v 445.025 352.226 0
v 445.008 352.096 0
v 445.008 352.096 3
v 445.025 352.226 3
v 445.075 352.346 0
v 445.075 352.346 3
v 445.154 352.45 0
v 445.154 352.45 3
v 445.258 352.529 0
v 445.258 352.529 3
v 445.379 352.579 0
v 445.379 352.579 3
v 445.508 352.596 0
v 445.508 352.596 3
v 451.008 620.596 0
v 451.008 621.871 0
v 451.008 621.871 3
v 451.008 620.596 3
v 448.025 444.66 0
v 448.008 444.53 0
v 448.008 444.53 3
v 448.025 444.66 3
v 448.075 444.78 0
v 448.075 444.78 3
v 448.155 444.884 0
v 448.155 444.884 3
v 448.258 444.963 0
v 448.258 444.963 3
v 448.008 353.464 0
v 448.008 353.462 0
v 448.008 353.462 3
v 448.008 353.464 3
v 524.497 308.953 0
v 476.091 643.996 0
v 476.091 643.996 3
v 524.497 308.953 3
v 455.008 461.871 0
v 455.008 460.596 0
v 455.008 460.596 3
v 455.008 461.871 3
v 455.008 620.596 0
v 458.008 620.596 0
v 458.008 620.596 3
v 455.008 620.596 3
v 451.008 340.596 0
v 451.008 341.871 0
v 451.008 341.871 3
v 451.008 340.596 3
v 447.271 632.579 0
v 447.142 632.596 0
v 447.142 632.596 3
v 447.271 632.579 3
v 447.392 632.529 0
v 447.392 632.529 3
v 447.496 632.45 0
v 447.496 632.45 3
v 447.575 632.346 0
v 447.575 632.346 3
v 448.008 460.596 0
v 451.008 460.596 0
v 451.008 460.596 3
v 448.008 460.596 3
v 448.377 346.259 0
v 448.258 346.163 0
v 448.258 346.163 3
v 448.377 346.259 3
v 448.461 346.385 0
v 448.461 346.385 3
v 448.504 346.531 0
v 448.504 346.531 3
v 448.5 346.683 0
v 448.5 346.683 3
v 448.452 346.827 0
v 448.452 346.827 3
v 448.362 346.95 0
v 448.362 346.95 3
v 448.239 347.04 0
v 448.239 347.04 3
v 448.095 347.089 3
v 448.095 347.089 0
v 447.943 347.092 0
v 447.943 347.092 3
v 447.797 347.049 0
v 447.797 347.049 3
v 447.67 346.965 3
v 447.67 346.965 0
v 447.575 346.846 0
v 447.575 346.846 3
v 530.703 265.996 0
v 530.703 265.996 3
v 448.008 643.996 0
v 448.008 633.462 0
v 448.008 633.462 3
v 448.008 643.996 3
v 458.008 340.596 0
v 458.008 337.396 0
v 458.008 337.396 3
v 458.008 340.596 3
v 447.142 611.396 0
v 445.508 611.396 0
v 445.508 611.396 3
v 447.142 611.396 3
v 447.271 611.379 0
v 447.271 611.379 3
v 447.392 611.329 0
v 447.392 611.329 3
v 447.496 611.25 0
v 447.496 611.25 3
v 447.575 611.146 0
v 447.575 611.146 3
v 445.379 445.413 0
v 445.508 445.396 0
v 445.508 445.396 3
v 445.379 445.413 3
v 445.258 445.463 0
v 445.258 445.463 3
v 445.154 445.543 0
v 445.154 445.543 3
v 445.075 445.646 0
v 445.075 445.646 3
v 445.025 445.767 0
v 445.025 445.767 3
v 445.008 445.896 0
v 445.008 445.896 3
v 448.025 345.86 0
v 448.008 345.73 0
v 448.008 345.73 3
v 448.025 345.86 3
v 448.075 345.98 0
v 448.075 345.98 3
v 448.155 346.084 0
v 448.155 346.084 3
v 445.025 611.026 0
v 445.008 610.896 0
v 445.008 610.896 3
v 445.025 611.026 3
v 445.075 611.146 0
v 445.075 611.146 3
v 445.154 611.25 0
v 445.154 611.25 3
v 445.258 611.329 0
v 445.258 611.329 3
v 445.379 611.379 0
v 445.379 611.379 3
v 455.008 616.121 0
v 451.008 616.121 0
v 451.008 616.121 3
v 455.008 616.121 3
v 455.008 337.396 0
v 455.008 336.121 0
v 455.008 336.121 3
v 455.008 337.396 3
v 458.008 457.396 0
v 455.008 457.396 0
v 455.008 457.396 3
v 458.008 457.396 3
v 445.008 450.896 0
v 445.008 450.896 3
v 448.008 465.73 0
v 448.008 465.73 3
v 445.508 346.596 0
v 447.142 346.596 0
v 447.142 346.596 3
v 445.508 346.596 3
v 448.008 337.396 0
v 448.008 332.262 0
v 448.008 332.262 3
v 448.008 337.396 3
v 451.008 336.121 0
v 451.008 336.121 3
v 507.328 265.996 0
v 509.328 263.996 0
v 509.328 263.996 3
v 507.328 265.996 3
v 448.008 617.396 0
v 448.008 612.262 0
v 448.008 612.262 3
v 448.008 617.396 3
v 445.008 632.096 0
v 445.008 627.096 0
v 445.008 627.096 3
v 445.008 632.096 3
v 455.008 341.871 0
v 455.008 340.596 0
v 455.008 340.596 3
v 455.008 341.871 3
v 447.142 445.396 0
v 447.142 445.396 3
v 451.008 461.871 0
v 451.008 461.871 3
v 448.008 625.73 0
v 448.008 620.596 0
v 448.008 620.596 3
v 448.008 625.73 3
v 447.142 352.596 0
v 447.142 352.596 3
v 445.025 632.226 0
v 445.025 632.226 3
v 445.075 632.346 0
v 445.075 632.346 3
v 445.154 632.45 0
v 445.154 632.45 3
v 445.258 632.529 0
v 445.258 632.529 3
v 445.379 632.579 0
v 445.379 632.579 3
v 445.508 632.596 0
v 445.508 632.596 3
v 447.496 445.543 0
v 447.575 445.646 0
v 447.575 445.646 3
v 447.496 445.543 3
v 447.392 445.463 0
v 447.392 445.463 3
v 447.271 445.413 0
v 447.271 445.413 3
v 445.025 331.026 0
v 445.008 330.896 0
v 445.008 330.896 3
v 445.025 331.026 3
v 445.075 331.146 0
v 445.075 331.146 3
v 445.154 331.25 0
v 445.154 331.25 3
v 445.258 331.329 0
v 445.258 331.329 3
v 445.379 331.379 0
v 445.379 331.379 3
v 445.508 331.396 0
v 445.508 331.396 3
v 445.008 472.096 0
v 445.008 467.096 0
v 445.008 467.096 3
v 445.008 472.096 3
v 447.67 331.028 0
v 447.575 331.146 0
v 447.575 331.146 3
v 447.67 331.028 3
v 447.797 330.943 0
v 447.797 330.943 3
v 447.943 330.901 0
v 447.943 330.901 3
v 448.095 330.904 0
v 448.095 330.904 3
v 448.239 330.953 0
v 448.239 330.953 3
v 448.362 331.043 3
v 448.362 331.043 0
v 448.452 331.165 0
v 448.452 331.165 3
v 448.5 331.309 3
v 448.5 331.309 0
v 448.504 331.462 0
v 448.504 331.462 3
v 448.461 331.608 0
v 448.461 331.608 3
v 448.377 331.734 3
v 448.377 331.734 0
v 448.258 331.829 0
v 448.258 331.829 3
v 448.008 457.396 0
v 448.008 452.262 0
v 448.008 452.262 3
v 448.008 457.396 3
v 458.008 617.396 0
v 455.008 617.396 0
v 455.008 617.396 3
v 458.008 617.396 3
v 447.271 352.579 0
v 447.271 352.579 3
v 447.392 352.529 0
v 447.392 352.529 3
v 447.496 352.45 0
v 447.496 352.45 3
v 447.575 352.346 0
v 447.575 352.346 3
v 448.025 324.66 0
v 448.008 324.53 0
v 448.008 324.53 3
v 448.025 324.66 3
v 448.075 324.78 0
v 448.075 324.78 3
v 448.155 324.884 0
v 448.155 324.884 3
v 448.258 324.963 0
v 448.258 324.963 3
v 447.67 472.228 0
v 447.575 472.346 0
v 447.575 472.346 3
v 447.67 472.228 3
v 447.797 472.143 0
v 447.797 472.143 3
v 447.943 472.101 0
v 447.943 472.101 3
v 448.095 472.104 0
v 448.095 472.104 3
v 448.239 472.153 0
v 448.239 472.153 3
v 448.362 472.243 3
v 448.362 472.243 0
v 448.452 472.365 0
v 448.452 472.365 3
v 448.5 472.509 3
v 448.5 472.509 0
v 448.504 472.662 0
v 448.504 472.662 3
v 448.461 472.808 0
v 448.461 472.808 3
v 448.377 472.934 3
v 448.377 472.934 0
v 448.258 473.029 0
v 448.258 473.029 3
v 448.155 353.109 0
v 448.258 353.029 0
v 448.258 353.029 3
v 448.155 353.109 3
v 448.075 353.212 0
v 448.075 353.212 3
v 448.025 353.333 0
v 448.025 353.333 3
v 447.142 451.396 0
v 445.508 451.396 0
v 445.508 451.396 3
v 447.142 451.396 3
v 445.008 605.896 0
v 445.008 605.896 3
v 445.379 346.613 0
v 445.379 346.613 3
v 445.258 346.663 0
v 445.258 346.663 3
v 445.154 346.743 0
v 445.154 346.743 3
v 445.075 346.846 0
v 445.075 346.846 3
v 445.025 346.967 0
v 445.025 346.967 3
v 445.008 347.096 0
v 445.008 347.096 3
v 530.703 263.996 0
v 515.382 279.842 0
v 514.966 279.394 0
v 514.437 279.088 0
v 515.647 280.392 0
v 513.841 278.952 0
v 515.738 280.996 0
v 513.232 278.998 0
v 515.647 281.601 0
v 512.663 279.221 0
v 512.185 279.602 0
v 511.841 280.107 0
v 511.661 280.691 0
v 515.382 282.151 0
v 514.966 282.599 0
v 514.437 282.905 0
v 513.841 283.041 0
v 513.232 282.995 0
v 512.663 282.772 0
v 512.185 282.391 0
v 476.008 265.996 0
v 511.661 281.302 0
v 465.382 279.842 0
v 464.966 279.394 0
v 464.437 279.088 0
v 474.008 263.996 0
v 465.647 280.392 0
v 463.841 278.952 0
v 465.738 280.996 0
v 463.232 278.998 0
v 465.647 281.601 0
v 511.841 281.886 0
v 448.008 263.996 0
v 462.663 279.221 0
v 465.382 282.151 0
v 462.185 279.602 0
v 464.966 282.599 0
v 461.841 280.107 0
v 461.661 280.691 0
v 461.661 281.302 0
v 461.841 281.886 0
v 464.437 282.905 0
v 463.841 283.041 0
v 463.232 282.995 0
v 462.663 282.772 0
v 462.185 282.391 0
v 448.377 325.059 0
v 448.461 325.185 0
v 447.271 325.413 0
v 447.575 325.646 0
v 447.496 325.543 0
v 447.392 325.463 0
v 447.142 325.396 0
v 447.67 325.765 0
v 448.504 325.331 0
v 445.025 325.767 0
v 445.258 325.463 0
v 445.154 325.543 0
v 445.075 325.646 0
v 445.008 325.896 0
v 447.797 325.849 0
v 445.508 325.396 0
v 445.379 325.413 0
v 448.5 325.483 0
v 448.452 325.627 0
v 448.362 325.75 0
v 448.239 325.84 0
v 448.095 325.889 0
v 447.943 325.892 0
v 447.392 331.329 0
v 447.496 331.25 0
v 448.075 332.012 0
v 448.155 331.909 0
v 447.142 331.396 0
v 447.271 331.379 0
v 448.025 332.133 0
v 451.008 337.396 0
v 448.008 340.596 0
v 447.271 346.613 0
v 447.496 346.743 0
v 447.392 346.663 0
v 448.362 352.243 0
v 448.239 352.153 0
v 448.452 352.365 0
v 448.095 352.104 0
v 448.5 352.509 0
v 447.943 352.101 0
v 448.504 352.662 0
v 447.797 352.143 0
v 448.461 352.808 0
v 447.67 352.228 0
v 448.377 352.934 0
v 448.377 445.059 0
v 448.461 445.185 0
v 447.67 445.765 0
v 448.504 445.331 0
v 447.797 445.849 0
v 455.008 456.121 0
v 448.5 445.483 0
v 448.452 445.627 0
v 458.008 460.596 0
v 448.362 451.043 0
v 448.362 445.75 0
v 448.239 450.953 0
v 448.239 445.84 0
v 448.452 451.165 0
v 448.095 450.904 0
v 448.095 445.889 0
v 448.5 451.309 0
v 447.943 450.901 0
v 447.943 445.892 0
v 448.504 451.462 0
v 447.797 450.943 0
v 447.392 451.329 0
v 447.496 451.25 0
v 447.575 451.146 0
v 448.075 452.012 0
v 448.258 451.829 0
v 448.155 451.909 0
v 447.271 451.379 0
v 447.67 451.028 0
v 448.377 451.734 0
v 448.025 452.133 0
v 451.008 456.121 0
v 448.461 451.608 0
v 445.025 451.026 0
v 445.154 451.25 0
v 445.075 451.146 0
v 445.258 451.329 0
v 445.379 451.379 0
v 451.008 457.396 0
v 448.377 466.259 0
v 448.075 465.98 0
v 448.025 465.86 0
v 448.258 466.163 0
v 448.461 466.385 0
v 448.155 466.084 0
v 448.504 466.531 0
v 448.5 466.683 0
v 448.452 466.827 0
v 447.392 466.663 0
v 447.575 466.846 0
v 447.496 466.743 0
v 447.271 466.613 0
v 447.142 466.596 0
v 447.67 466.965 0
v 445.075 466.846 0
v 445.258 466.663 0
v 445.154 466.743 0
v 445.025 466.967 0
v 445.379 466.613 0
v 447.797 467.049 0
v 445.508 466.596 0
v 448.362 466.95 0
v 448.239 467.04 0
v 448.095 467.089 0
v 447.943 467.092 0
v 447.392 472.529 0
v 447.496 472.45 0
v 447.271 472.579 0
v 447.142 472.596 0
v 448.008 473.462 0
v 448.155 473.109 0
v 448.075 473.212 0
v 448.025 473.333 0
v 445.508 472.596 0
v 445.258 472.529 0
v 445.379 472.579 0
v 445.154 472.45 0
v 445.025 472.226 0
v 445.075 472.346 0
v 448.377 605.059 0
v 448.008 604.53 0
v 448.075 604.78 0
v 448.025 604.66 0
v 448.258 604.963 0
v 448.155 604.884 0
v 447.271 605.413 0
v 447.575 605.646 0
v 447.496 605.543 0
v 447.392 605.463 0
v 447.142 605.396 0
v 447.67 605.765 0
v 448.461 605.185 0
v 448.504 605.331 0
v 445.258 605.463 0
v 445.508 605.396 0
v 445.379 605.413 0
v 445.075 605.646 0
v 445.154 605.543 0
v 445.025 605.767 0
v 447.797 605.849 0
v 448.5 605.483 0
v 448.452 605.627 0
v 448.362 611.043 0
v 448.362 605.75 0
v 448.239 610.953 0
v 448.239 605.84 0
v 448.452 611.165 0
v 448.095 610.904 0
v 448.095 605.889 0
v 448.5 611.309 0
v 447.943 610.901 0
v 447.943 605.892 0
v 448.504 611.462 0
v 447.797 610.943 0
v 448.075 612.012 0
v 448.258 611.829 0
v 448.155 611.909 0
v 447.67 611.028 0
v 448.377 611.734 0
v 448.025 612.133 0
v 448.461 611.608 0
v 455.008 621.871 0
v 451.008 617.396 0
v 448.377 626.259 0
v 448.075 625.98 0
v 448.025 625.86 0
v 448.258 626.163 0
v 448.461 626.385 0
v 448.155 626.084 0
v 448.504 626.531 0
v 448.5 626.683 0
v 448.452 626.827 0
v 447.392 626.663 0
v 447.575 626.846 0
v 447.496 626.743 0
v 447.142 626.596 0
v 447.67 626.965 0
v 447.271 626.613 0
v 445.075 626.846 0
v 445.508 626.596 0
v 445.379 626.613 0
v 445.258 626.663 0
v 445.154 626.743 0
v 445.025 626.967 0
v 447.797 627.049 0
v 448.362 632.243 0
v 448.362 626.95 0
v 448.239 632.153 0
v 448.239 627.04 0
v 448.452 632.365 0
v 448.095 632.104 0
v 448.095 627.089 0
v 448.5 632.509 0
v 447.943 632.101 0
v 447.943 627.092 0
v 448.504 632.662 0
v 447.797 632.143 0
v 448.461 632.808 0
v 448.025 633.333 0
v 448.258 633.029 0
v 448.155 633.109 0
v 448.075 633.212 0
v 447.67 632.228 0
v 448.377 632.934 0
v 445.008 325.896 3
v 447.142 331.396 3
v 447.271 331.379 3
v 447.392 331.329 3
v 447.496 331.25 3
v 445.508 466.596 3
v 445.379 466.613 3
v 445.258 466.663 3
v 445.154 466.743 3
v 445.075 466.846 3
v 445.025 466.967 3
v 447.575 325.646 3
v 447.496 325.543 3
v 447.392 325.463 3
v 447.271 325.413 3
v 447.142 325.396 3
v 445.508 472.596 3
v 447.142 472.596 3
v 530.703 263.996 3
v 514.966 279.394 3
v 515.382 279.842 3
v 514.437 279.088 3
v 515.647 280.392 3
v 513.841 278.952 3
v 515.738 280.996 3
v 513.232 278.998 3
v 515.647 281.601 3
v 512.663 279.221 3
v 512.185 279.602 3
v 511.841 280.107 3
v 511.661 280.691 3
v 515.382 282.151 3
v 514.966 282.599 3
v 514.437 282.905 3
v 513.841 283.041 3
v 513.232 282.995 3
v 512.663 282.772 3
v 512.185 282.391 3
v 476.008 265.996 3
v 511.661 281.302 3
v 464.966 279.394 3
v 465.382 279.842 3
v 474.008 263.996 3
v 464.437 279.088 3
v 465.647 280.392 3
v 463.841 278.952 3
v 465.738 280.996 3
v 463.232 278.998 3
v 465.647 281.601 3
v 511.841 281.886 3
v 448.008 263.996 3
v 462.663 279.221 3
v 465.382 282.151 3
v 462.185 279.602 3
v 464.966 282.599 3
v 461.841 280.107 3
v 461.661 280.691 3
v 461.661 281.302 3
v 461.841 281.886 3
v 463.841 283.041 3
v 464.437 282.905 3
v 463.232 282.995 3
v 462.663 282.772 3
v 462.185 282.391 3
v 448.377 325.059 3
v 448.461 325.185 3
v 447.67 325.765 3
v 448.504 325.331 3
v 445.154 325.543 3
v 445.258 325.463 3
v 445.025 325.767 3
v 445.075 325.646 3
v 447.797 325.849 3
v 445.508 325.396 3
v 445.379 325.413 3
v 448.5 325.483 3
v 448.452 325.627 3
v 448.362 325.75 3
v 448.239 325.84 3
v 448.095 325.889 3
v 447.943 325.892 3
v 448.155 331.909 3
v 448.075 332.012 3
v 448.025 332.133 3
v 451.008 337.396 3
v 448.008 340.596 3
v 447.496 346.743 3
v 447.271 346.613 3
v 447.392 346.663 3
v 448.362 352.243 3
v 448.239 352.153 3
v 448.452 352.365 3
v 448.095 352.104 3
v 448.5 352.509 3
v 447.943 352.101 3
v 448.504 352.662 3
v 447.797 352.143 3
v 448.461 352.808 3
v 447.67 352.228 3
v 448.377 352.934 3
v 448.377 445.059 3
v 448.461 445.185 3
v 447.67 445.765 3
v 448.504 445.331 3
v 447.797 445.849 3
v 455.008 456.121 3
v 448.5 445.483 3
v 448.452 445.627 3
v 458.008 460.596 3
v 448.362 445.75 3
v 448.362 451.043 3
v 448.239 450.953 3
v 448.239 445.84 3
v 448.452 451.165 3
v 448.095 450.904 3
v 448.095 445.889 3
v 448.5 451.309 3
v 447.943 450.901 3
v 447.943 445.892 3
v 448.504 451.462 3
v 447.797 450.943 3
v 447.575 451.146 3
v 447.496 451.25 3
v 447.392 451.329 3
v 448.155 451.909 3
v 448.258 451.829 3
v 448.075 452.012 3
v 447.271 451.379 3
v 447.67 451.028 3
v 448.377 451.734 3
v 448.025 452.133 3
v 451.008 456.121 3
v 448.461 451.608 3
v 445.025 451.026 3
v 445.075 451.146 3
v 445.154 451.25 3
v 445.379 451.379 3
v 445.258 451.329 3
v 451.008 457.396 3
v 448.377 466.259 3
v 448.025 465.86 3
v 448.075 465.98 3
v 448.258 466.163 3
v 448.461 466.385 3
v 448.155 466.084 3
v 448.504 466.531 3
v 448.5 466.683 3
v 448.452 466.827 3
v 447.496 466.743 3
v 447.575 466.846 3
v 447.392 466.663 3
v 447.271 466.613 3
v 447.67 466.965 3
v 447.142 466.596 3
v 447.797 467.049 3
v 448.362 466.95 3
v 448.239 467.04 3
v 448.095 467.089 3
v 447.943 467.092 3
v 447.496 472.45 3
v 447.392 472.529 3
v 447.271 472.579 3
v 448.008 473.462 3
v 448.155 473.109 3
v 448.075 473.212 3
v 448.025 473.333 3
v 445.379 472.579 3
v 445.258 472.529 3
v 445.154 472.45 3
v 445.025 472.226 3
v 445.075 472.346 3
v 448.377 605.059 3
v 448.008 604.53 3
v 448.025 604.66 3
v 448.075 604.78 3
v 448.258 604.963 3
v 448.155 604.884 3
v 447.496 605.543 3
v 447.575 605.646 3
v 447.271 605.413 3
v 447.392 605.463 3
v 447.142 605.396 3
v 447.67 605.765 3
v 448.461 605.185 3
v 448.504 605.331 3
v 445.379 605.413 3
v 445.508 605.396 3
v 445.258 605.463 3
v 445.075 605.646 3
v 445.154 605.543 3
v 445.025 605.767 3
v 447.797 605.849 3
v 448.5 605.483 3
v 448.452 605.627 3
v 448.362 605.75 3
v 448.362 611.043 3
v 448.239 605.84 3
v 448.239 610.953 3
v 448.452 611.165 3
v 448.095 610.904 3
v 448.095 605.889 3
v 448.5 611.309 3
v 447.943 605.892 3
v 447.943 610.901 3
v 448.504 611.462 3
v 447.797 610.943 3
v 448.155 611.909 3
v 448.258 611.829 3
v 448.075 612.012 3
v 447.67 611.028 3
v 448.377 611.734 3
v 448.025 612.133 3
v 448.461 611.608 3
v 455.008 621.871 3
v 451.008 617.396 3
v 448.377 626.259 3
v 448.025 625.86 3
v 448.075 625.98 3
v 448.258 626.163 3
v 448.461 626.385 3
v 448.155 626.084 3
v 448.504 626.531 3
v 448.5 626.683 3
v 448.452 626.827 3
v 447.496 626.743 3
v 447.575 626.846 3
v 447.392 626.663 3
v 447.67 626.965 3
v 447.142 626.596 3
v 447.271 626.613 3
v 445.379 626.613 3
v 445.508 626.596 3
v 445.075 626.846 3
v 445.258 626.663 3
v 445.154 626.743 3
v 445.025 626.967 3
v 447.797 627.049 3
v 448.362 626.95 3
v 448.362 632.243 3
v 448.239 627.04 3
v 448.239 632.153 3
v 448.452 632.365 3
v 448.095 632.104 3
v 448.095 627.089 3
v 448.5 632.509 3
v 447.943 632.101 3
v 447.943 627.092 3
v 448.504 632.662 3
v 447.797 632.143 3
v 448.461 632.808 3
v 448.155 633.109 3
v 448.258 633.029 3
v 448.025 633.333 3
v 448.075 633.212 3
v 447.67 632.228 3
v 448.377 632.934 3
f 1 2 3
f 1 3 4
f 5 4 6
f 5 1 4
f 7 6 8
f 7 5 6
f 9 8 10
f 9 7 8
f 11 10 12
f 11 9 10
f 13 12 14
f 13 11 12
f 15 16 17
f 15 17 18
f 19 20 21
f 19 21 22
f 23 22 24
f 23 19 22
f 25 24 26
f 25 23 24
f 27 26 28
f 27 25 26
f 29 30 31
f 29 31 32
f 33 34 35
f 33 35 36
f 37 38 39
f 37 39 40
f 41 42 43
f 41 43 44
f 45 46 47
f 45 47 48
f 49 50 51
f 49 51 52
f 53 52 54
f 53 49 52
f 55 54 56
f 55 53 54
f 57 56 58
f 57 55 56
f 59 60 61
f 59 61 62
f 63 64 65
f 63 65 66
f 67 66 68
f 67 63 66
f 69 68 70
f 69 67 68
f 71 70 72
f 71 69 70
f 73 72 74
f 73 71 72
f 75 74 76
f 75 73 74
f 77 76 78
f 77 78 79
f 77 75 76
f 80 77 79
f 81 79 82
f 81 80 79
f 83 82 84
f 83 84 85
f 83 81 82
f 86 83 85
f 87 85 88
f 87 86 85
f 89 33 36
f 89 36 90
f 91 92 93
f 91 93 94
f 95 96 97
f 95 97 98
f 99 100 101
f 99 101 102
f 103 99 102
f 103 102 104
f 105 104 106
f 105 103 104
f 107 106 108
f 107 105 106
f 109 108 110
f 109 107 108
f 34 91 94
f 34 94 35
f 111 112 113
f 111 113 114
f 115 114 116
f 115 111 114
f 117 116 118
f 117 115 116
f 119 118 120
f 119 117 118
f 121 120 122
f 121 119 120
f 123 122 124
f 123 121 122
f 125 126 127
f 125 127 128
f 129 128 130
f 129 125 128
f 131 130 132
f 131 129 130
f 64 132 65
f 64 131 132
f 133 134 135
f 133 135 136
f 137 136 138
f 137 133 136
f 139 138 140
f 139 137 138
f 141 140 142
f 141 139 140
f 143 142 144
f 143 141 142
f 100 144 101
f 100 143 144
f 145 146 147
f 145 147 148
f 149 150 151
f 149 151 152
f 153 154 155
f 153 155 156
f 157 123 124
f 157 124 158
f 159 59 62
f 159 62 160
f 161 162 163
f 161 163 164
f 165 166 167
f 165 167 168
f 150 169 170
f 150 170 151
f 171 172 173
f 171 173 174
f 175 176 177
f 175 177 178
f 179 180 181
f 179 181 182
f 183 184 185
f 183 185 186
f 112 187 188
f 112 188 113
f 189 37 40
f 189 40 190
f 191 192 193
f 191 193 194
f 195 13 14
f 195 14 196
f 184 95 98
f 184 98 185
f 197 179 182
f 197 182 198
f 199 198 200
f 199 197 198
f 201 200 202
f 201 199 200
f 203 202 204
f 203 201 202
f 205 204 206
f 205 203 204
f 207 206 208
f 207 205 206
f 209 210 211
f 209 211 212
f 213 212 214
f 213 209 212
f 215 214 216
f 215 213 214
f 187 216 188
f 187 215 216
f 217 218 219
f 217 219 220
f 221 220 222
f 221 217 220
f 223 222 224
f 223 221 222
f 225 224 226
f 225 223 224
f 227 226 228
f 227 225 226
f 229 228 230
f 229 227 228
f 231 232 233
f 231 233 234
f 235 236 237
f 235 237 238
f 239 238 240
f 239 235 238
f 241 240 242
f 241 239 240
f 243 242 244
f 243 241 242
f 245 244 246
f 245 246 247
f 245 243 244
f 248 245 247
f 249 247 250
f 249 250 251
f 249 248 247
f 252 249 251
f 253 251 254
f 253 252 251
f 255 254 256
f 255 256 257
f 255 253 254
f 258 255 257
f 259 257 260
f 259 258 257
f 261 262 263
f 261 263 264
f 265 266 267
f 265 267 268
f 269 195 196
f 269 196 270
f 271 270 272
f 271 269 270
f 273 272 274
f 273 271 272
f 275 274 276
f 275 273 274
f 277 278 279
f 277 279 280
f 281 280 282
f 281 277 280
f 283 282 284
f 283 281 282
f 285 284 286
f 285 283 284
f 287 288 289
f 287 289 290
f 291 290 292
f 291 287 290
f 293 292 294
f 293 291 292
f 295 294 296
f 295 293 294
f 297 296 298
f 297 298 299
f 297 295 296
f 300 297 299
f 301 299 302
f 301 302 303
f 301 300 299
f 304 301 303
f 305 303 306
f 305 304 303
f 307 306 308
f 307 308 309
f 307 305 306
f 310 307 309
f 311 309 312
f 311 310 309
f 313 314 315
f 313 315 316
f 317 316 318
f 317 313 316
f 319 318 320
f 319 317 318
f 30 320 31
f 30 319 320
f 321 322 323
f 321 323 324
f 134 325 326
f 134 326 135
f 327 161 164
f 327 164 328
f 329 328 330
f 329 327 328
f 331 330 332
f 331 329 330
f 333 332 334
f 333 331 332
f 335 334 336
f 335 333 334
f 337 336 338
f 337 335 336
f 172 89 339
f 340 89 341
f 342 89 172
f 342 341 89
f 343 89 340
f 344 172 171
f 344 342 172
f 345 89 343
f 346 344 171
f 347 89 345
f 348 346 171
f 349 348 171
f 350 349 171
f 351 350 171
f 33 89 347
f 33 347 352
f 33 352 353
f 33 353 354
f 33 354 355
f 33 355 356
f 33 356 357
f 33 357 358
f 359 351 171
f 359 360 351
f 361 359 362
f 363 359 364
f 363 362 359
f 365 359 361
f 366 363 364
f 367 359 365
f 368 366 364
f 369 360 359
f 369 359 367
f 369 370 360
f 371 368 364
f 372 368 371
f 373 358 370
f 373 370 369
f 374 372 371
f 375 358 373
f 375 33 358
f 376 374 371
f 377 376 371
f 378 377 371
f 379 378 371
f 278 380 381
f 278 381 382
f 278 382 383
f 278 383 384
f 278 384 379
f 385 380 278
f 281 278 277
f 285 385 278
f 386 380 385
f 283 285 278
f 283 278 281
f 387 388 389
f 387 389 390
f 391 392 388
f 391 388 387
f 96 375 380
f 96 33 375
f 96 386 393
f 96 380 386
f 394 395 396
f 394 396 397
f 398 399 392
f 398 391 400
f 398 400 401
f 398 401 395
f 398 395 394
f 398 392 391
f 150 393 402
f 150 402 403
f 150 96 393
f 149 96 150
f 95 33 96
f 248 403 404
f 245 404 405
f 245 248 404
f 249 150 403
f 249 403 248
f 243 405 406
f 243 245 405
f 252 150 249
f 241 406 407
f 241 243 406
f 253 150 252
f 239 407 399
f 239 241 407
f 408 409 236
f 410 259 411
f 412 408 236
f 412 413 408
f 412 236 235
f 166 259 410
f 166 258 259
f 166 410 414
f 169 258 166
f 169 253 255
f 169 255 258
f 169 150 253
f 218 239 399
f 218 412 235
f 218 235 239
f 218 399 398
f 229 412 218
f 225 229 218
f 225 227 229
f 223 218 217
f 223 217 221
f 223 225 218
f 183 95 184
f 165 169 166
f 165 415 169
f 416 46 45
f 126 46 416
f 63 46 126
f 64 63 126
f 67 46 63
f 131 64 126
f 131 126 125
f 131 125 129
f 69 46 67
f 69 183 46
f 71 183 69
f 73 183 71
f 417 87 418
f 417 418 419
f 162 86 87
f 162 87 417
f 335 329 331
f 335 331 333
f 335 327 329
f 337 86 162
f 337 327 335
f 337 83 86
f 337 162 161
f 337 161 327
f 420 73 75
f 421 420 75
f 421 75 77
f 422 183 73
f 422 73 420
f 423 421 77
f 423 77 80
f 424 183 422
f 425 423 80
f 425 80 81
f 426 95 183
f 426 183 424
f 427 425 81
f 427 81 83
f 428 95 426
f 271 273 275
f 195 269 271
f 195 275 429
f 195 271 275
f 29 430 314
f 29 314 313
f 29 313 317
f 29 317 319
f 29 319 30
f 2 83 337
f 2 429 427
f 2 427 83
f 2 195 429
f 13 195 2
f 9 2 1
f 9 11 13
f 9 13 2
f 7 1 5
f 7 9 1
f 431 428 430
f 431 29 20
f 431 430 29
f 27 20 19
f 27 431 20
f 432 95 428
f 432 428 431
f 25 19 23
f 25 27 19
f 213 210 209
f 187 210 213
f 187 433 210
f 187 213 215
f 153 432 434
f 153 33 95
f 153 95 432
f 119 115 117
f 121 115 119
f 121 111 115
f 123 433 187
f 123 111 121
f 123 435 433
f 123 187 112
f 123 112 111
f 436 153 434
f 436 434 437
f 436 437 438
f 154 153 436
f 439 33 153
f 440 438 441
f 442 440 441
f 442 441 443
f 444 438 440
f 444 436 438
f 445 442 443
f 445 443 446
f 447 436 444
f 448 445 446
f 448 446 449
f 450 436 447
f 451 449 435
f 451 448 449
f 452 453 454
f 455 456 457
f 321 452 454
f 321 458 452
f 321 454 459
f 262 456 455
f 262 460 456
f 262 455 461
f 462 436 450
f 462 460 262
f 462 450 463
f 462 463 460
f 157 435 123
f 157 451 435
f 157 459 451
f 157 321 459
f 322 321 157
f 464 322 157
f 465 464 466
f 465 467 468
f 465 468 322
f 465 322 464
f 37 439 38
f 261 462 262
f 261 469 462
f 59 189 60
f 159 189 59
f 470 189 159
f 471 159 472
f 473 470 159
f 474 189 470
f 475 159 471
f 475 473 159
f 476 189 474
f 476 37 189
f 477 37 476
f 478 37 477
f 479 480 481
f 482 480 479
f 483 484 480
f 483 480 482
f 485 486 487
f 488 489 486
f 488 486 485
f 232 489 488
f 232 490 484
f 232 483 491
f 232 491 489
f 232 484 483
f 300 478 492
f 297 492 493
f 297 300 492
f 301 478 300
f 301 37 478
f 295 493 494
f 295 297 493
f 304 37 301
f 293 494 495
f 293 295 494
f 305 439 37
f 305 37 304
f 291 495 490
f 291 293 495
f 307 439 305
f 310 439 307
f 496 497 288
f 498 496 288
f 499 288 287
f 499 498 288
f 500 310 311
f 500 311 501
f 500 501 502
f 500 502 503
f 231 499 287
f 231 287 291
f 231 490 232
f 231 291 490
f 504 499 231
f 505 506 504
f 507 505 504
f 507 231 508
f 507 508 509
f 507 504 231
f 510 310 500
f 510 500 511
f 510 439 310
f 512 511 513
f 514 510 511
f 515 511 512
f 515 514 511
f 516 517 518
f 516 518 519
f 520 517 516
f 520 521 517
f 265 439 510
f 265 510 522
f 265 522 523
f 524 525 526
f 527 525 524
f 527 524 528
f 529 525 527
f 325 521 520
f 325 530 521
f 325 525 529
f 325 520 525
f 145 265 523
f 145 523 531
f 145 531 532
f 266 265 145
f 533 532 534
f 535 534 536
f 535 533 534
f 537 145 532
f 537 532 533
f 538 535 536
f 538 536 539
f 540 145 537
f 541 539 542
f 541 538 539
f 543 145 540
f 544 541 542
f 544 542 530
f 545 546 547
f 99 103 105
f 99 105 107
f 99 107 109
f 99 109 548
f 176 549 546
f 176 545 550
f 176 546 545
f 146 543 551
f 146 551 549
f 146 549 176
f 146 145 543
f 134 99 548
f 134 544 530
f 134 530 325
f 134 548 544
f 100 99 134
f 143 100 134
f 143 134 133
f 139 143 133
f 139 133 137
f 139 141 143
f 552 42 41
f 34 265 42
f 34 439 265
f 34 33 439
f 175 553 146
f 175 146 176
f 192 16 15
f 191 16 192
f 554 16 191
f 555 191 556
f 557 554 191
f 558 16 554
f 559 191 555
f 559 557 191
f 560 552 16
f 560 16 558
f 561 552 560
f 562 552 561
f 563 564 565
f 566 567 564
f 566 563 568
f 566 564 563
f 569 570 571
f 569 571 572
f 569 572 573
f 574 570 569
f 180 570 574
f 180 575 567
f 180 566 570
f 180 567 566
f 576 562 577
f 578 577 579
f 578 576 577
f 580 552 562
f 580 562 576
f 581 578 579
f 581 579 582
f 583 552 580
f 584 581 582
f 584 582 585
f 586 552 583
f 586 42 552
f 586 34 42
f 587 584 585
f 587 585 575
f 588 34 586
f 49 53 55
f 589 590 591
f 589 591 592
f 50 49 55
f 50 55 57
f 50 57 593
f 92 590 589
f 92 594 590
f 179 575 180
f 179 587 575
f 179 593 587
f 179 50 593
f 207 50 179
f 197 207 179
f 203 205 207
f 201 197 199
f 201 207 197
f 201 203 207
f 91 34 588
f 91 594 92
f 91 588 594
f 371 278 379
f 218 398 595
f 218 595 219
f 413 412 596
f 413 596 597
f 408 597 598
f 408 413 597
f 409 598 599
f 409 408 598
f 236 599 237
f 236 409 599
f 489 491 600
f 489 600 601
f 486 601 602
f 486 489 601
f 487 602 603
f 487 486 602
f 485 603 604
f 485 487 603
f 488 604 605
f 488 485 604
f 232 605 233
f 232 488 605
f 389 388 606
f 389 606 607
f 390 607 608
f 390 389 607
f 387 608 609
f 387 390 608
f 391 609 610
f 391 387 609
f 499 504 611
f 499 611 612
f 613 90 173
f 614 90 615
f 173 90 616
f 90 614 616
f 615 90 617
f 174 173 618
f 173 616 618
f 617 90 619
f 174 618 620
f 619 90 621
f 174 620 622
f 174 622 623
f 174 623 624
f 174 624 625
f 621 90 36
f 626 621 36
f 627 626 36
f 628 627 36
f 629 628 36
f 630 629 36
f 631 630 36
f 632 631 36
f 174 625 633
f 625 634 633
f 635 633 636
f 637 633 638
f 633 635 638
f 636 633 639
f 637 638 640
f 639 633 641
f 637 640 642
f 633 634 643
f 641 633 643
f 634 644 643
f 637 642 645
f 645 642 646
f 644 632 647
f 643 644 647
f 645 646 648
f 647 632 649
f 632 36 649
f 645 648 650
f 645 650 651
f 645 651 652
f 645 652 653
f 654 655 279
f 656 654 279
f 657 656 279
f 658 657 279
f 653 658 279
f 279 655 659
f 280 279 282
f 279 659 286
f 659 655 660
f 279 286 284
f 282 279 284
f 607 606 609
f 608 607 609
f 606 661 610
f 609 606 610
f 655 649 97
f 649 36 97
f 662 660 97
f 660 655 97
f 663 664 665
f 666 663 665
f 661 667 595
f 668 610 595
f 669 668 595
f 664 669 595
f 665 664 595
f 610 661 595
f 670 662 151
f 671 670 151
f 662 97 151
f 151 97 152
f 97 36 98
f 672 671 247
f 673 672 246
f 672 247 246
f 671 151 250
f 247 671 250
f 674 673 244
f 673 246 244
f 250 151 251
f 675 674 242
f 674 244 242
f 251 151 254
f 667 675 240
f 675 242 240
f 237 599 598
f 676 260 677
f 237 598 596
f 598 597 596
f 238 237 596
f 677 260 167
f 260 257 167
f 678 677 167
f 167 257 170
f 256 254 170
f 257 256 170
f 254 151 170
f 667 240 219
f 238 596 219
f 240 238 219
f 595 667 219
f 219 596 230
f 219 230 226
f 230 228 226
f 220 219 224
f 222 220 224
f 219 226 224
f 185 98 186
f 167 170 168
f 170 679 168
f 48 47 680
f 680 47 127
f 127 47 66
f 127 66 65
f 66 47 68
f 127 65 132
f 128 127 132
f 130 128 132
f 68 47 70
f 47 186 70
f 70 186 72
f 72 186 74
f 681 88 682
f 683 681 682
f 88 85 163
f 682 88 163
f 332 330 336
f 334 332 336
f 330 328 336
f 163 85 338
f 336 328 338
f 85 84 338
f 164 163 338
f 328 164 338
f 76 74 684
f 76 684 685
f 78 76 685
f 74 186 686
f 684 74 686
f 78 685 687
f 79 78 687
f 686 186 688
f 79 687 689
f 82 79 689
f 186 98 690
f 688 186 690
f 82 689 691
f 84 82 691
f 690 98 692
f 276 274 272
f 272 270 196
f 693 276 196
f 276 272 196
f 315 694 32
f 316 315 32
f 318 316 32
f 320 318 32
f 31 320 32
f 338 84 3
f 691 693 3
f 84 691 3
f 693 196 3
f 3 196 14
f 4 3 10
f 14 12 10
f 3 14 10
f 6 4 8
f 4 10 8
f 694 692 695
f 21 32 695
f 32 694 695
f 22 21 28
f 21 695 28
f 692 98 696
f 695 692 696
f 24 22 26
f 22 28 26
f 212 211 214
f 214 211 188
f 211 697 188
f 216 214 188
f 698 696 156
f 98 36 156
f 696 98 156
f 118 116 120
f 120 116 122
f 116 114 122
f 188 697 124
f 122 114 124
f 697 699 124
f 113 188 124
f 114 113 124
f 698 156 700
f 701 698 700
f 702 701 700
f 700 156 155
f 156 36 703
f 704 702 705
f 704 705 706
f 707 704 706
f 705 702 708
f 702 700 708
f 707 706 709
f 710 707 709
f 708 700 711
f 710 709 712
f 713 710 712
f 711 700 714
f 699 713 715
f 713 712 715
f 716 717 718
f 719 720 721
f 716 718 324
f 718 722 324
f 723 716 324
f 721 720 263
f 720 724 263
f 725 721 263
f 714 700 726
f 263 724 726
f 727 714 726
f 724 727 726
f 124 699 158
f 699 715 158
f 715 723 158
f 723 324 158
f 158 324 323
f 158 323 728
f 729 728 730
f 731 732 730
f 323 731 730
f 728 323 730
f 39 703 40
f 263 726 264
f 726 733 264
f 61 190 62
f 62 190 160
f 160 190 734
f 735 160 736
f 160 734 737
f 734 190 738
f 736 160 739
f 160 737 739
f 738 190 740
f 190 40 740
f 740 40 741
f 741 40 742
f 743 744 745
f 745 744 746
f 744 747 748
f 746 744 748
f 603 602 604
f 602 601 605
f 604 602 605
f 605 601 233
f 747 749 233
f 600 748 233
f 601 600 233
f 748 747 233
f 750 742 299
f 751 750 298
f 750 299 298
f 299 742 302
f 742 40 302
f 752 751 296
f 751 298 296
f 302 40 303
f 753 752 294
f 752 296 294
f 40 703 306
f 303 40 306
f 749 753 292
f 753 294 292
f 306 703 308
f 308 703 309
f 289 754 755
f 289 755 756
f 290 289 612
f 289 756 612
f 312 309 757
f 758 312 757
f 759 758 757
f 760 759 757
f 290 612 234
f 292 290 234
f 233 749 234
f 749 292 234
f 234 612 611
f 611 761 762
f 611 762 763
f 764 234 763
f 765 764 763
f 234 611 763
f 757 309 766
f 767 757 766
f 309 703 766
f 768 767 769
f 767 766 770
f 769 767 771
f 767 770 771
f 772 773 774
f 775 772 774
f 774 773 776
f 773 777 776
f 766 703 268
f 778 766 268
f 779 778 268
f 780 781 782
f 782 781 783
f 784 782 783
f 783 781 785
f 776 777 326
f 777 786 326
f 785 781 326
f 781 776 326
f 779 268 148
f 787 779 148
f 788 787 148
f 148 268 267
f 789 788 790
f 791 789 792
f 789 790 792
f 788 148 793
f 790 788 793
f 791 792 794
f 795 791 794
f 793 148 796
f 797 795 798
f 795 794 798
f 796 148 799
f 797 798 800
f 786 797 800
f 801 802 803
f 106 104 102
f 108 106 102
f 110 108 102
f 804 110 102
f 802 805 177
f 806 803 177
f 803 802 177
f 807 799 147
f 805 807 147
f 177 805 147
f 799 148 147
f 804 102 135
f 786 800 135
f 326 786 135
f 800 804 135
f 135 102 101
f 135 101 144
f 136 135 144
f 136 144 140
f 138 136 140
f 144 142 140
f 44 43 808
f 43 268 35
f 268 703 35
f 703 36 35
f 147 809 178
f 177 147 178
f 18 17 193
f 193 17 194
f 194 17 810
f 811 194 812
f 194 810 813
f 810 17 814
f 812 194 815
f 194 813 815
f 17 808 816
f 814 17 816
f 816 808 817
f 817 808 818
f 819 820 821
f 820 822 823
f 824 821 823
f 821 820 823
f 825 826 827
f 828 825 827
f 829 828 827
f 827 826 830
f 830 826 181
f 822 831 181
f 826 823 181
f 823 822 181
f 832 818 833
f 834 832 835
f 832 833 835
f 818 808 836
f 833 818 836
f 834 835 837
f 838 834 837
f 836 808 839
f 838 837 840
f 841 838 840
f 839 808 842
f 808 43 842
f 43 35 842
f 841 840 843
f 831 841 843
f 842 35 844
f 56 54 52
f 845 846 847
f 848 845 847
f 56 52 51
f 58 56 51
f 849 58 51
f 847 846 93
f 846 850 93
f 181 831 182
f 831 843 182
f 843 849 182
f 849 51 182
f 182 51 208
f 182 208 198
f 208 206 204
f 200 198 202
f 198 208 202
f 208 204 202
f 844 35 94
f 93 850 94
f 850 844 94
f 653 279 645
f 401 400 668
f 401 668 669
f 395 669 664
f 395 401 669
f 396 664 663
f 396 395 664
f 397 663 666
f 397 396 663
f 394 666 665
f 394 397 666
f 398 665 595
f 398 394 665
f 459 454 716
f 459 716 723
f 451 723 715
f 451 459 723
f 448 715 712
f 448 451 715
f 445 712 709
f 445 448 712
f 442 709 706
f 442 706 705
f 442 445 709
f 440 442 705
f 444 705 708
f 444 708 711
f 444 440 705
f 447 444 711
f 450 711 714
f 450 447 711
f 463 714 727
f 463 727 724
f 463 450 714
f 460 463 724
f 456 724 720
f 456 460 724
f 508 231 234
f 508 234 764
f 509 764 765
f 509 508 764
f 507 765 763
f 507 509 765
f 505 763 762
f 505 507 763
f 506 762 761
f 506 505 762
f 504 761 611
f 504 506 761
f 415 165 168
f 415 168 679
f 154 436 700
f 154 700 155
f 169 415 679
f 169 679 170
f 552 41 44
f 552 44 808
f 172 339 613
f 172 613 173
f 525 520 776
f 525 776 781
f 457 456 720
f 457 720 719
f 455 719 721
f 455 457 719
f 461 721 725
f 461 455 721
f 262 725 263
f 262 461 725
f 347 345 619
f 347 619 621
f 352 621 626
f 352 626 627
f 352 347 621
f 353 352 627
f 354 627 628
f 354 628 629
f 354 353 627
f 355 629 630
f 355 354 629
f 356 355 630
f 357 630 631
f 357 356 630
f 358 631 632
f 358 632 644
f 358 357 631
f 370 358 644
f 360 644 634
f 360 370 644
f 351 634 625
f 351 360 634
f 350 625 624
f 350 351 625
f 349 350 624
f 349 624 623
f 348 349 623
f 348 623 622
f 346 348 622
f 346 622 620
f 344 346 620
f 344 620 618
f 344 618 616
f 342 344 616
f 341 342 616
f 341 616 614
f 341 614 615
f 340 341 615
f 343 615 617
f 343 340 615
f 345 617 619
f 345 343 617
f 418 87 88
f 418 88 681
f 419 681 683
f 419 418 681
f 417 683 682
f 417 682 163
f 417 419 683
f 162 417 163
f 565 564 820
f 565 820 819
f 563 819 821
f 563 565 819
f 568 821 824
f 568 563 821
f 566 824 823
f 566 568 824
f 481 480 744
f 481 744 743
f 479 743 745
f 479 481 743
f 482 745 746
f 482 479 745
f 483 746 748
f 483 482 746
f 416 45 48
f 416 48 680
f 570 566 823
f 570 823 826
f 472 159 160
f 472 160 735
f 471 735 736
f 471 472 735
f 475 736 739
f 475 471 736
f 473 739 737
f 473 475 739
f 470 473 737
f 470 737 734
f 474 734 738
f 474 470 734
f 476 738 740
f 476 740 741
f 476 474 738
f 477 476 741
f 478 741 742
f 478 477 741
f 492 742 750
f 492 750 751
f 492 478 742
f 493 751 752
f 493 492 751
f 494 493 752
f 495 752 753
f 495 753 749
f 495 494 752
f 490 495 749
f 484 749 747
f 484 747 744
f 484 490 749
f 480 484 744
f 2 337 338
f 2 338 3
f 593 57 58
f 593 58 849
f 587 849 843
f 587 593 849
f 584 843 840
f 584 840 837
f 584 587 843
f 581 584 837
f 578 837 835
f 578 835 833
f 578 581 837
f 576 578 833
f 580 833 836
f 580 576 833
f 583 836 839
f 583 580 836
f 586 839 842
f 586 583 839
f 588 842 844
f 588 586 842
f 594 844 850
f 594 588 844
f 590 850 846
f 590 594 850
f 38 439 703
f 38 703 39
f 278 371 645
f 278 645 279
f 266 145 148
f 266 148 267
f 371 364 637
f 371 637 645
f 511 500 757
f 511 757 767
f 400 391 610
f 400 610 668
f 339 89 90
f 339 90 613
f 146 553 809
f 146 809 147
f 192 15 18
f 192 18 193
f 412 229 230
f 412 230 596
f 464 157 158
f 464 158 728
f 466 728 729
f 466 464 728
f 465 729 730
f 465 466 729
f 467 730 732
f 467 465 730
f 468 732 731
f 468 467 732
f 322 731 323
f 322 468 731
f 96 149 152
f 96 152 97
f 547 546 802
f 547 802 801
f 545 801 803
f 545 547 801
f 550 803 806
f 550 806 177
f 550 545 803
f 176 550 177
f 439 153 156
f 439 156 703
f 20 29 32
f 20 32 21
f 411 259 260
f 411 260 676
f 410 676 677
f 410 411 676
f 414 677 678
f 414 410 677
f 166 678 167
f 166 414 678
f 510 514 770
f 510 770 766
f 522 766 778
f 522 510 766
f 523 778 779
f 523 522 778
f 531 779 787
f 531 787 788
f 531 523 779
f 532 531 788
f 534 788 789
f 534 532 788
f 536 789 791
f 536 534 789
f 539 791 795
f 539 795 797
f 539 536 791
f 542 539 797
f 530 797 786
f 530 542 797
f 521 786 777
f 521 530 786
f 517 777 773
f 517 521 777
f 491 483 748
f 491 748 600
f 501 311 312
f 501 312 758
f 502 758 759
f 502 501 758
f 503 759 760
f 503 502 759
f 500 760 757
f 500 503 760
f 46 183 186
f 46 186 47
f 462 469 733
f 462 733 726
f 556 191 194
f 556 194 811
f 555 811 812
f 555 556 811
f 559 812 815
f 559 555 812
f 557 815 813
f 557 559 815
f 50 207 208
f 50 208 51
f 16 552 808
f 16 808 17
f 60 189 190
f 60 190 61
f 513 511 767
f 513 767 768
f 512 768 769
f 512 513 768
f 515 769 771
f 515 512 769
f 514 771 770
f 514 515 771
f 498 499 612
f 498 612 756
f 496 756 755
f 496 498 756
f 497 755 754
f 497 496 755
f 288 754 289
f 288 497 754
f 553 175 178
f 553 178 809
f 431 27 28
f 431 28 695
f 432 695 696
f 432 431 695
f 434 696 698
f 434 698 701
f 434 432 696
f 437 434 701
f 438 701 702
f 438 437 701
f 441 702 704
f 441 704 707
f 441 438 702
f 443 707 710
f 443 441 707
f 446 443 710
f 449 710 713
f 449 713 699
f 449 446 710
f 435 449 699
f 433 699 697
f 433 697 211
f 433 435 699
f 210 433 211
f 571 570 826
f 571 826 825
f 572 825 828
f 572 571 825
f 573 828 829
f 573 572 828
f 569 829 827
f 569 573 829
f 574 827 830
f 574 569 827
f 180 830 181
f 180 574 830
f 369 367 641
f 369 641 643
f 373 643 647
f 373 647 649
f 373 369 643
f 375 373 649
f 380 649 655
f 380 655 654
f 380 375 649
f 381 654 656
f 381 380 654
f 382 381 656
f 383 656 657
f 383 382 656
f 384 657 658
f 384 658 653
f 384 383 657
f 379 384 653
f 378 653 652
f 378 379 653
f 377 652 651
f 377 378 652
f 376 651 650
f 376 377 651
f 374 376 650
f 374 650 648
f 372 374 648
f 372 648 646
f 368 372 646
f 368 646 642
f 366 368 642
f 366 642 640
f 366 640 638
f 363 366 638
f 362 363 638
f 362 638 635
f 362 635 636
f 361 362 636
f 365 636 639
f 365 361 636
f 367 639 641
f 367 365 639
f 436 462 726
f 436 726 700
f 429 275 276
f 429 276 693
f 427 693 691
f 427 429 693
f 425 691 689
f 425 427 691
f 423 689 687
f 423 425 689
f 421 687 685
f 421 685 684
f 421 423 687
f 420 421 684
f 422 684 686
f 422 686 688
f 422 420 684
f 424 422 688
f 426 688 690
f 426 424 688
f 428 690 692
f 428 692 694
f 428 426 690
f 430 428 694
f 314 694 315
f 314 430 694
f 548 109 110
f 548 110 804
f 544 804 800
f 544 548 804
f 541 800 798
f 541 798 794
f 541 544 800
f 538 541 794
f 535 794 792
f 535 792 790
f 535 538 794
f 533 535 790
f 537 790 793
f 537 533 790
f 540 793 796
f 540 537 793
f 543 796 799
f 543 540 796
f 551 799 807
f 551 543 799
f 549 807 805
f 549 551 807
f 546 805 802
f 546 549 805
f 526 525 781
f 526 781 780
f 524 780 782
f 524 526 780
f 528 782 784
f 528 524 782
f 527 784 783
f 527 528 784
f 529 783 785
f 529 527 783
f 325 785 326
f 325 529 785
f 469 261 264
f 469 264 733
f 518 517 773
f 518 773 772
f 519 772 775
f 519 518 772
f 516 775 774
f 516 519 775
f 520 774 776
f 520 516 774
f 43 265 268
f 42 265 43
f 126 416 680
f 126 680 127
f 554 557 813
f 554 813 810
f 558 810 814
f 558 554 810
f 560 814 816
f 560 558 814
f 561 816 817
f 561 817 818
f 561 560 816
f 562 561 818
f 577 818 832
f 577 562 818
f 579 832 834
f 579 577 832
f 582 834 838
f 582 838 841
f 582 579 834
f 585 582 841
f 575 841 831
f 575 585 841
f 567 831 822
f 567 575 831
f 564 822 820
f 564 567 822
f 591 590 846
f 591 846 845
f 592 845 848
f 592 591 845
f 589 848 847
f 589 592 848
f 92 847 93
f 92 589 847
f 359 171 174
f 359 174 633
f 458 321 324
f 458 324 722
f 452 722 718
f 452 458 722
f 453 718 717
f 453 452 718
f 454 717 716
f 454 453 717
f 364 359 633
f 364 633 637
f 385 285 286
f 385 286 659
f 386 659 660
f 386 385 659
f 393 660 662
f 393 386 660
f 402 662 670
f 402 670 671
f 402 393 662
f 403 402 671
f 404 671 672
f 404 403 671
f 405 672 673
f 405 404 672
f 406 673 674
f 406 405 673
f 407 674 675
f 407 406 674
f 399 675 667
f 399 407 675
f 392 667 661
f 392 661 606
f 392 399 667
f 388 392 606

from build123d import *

# Parameters (mm, degrees)
MODEL_R                 = 2.05
SALIENTE_EXTRUIR1_DEPTH = 3


with BuildPart() as part:
    # Model → Saliente-Extruir1 (new body)
    with BuildSketch(Plane.XY):
        with BuildLine():
            Line((458.658091322, 643.996335498), (476.091013084, 643.996335498))
            Line((476.091013084, 643.996335498), (524.497055169, 308.953007972))
            Line((524.497055169, 308.953007972), (530.703308605, 265.996308498))
            Line((530.703308605, 265.996308498), (530.703308605, 263.996308498))
            Line((530.703308605, 263.996308498), (509.328287285, 263.996308498))
            Line((509.328287285, 263.996308498), (507.328283285, 265.996308498))
            Line((507.328283285, 265.996308498), (476.008092322, 265.996308498))
            Line((476.008092322, 265.996308498), (474.008092322, 263.996308498))
            Line((474.008092322, 263.996308498), (448.008092322, 263.996308498))
            Line((448.008092322, 263.996308498), (448.008095322, 324.530272498))
            ThreePointArc((448.008095322, 324.530272498), (448.075082188, 324.78027175), (448.258093826, 324.963284336))
            ThreePointArc((448.258093826, 324.963284336), (448.361645507, 325.749850684), (447.57507962, 325.646295498))
            ThreePointArc((447.57507962, 325.646295498), (447.39206666, 325.463282647), (447.142066322, 325.396295498))
            Line((447.142066322, 325.396295498), (445.508040322, 325.396292498))
            ThreePointArc((445.508040322, 325.396292498), (445.154486932, 325.542739108), (445.008040322, 325.896292498))
            Line((445.008040322, 325.896292498), (445.008040322, 330.896290498))
            ThreePointArc((445.008040322, 330.896290498), (445.154486932, 331.249843889), (445.508040322, 331.396290498))
            Line((445.508040322, 331.396290498), (447.142068322, 331.396290498))
            ThreePointArc((447.142068322, 331.396290498), (447.392067574, 331.329303632), (447.57508016, 331.146291995))
            ThreePointArc((447.57508016, 331.146291995), (448.361645749, 331.042740921), (448.258092322, 331.8293062))
            ThreePointArc((448.258092322, 331.8293062), (448.075079721, 332.012318727), (448.008092322, 332.262318498))
            Line((448.008092322, 332.262318498), (448.008092322, 337.396312498))
            Line((448.008092322, 337.396312498), (451.008064322, 337.396312498))
            Line((451.008064322, 337.396312498), (451.008064322, 336.121317498))
            Line((451.008064322, 336.121317498), (455.008092322, 336.121317498))
            Line((455.008092322, 336.121317498), (455.008092322, 337.396312498))
            Line((455.008092322, 337.396312498), (458.008092322, 337.396312498))
            Line((458.008092322, 337.396312498), (458.008092322, 340.596323498))
            Line((458.008092322, 340.596323498), (455.008092322, 340.596323498))
            Line((455.008092322, 340.596323498), (455.008092322, 341.871317498))
            Line((455.008092322, 341.871317498), (451.008064322, 341.871317498))
            Line((451.008064322, 341.871317498), (451.008064322, 340.596323498))
            Line((451.008064322, 340.596323498), (448.008092322, 340.596323498))
            Line((448.008092322, 340.596323498), (448.008095322, 345.730288498))
            ThreePointArc((448.008095322, 345.730288498), (448.075082188, 345.98028775), (448.258093826, 346.163300336))
            ThreePointArc((448.258093826, 346.163300336), (448.3616449, 346.949865925), (447.57507962, 346.846312498))
            ThreePointArc((447.57507962, 346.846312498), (447.39206666, 346.663299647), (447.142066322, 346.596312498))
            Line((447.142066322, 346.596312498), (445.508040322, 346.596309498))
            ThreePointArc((445.508040322, 346.596309498), (445.154486932, 346.742756108), (445.008040322, 347.096309498))
            Line((445.008040322, 347.096309498), (445.008040322, 352.096306498))
            ThreePointArc((445.008040322, 352.096306498), (445.154486932, 352.449859889), (445.508040322, 352.596306498))
            Line((445.508040322, 352.596306498), (447.142068322, 352.596306498))
            ThreePointArc((447.142068322, 352.596306498), (447.392067574, 352.529319632), (447.57508016, 352.346307995))
            ThreePointArc((447.57508016, 352.346307995), (448.361645749, 352.242756921), (448.258092322, 353.0293222))
            ThreePointArc((448.258092322, 353.0293222), (448.075079721, 353.212334727), (448.008092322, 353.462334498))
            Line((448.008092322, 353.462334498), (448.008095322, 353.464066546))
            Line((448.008095322, 353.464066546), (448.008095322, 444.530276498))
            ThreePointArc((448.008095322, 444.530276498), (448.075082188, 444.78027575), (448.258093826, 444.963288336))
            ThreePointArc((448.258093826, 444.963288336), (448.361645507, 445.749854684), (447.57507962, 445.646299498))
            ThreePointArc((447.57507962, 445.646299498), (447.39206666, 445.463286647), (447.142066322, 445.396299498))
            Line((447.142066322, 445.396299498), (445.508040322, 445.396296498))
            ThreePointArc((445.508040322, 445.396296498), (445.154486932, 445.542743108), (445.008040322, 445.896296498))
            Line((445.008040322, 445.896296498), (445.008040322, 450.896294498))
            ThreePointArc((445.008040322, 450.896294498), (445.154486932, 451.249847889), (445.508040322, 451.396294498))
            Line((445.508040322, 451.396294498), (447.142068322, 451.396294498))
            ThreePointArc((447.142068322, 451.396294498), (447.392067574, 451.329307632), (447.57508016, 451.146295995))
            ThreePointArc((447.57508016, 451.146295995), (448.361645749, 451.042744921), (448.258092322, 451.8293102))
            ThreePointArc((448.258092322, 451.8293102), (448.075079721, 452.012322727), (448.008092322, 452.262322498))
            Line((448.008092322, 452.262322498), (448.008092322, 457.396316498))
            Line((448.008092322, 457.396316498), (451.008064322, 457.396316498))
            Line((451.008064322, 457.396316498), (451.008064322, 456.121321498))
            Line((451.008064322, 456.121321498), (455.008092322, 456.121321498))
            Line((455.008092322, 456.121321498), (455.008092322, 457.396316498))
            Line((455.008092322, 457.396316498), (458.008092322, 457.396316498))
            Line((458.008092322, 457.396316498), (458.008092322, 460.596327498))
            Line((458.008092322, 460.596327498), (455.008092322, 460.596327498))
            Line((455.008092322, 460.596327498), (455.008092322, 461.871321498))
            Line((455.008092322, 461.871321498), (451.008064322, 461.871321498))
            Line((451.008064322, 461.871321498), (451.008064322, 460.596327498))
            Line((451.008064322, 460.596327498), (448.008092322, 460.596327498))
            Line((448.008092322, 460.596327498), (448.008095322, 465.730292498))
            ThreePointArc((448.008095322, 465.730292498), (448.075082188, 465.98029175), (448.258093826, 466.163304336))
            ThreePointArc((448.258093826, 466.163304336), (448.361645507, 466.949870684), (447.57507962, 466.846315498))
            ThreePointArc((447.57507962, 466.846315498), (447.39206666, 466.663302647), (447.142066322, 466.596315498))
            Line((447.142066322, 466.596315498), (445.508040322, 466.596312498))
            ThreePointArc((445.508040322, 466.596312498), (445.154486932, 466.742759108), (445.008040322, 467.096312498))
            Line((445.008040322, 467.096312498), (445.008040322, 472.096310498))
            ThreePointArc((445.008040322, 472.096310498), (445.154486932, 472.449863889), (445.508040322, 472.596310498))
            Line((445.508040322, 472.596310498), (447.142068322, 472.596310498))
            ThreePointArc((447.142068322, 472.596310498), (447.392067574, 472.529323632), (447.57508016, 472.346311995))
            ThreePointArc((447.57508016, 472.346311995), (448.361645749, 472.242760921), (448.258092322, 473.0293262))
            ThreePointArc((448.258092322, 473.0293262), (448.075081422, 473.212339245), (448.008095322, 473.462338498))
            Line((448.008095322, 473.462338498), (448.008095322, 473.464070546))
            Line((448.008095322, 473.464070546), (448.008095322, 604.530272498))
            ThreePointArc((448.008095322, 604.530272498), (448.075082188, 604.78027175), (448.258093826, 604.963284336))
            ThreePointArc((448.258093826, 604.963284336), (448.3616449, 605.749849925), (447.57507962, 605.646296498))
            ThreePointArc((447.57507962, 605.646296498), (447.39206666, 605.463283647), (447.142066322, 605.396296498))
            Line((447.142066322, 605.396296498), (445.508040322, 605.396293498))
            ThreePointArc((445.508040322, 605.396293498), (445.154486932, 605.542740108), (445.008040322, 605.896293498))
            Line((445.008040322, 605.896293498), (445.008040322, 610.896290498))
            ThreePointArc((445.008040322, 610.896290498), (445.154486932, 611.249843889), (445.508040322, 611.396290498))
            Line((445.508040322, 611.396290498), (447.142068322, 611.396290498))
            ThreePointArc((447.142068322, 611.396290498), (447.392067574, 611.329303632), (447.57508016, 611.146291995))
            ThreePointArc((447.57508016, 611.146291995), (448.361645749, 611.042740921), (448.258092322, 611.8293062))
            ThreePointArc((448.258092322, 611.8293062), (448.075079721, 612.012318727), (448.008092322, 612.262318498))
            Line((448.008092322, 612.262318498), (448.008092322, 617.396312498))
            Line((448.008092322, 617.396312498), (451.008064322, 617.396312498))
            Line((451.008064322, 617.396312498), (451.008064322, 616.121318498))
            Line((451.008064322, 616.121318498), (455.008092322, 616.121318498))
            Line((455.008092322, 616.121318498), (455.008092322, 617.396312498))
            Line((455.008092322, 617.396312498), (458.008092322, 617.396312498))
            Line((458.008092322, 617.396312498), (458.008092322, 620.596323498))
            Line((458.008092322, 620.596323498), (455.008092322, 620.596323498))
            Line((455.008092322, 620.596323498), (455.008092322, 621.871318498))
            Line((455.008092322, 621.871318498), (451.008064322, 621.871318498))
            Line((451.008064322, 621.871318498), (451.008064322, 620.596323498))
            Line((451.008064322, 620.596323498), (448.008092322, 620.596323498))
            Line((448.008092322, 620.596323498), (448.008095322, 625.730288498))
            ThreePointArc((448.008095322, 625.730288498), (448.075082188, 625.98028775), (448.258093826, 626.163300336))
            ThreePointArc((448.258093826, 626.163300336), (448.3616449, 626.949865925), (447.57507962, 626.846312498))
            ThreePointArc((447.57507962, 626.846312498), (447.39206666, 626.663299647), (447.142066322, 626.596312498))
            Line((447.142066322, 626.596312498), (445.508040322, 626.596309498))
            ThreePointArc((445.508040322, 626.596309498), (445.154486932, 626.742756108), (445.008040322, 627.096309498))
            Line((445.008040322, 627.096309498), (445.008040322, 632.096306498))
            ThreePointArc((445.008040322, 632.096306498), (445.154486932, 632.449859889), (445.508040322, 632.596306498))
            Line((445.508040322, 632.596306498), (447.142068322, 632.596306498))
            ThreePointArc((447.142068322, 632.596306498), (447.392067574, 632.529319632), (447.57508016, 632.346307995))
            ThreePointArc((447.57508016, 632.346307995), (448.361645749, 632.242756921), (448.258092322, 633.0293222))
            ThreePointArc((448.258092322, 633.0293222), (448.075079471, 633.21233516), (448.008092322, 633.462335498))
            Line((448.008092322, 633.462335498), (448.008092322, 643.996335498))
            Line((448.008092322, 643.996335498), (458.658091322, 643.996335498))
        make_face()
        with Locations((463.687972981, 280.996308498)):
            Circle(MODEL_R, mode=Mode.SUBTRACT)
        with Locations((513.687972981, 280.996308498)):
            Circle(MODEL_R, mode=Mode.SUBTRACT)
    extrude(amount=SALIENTE_EXTRUIR1_DEPTH)


solid = part.part
